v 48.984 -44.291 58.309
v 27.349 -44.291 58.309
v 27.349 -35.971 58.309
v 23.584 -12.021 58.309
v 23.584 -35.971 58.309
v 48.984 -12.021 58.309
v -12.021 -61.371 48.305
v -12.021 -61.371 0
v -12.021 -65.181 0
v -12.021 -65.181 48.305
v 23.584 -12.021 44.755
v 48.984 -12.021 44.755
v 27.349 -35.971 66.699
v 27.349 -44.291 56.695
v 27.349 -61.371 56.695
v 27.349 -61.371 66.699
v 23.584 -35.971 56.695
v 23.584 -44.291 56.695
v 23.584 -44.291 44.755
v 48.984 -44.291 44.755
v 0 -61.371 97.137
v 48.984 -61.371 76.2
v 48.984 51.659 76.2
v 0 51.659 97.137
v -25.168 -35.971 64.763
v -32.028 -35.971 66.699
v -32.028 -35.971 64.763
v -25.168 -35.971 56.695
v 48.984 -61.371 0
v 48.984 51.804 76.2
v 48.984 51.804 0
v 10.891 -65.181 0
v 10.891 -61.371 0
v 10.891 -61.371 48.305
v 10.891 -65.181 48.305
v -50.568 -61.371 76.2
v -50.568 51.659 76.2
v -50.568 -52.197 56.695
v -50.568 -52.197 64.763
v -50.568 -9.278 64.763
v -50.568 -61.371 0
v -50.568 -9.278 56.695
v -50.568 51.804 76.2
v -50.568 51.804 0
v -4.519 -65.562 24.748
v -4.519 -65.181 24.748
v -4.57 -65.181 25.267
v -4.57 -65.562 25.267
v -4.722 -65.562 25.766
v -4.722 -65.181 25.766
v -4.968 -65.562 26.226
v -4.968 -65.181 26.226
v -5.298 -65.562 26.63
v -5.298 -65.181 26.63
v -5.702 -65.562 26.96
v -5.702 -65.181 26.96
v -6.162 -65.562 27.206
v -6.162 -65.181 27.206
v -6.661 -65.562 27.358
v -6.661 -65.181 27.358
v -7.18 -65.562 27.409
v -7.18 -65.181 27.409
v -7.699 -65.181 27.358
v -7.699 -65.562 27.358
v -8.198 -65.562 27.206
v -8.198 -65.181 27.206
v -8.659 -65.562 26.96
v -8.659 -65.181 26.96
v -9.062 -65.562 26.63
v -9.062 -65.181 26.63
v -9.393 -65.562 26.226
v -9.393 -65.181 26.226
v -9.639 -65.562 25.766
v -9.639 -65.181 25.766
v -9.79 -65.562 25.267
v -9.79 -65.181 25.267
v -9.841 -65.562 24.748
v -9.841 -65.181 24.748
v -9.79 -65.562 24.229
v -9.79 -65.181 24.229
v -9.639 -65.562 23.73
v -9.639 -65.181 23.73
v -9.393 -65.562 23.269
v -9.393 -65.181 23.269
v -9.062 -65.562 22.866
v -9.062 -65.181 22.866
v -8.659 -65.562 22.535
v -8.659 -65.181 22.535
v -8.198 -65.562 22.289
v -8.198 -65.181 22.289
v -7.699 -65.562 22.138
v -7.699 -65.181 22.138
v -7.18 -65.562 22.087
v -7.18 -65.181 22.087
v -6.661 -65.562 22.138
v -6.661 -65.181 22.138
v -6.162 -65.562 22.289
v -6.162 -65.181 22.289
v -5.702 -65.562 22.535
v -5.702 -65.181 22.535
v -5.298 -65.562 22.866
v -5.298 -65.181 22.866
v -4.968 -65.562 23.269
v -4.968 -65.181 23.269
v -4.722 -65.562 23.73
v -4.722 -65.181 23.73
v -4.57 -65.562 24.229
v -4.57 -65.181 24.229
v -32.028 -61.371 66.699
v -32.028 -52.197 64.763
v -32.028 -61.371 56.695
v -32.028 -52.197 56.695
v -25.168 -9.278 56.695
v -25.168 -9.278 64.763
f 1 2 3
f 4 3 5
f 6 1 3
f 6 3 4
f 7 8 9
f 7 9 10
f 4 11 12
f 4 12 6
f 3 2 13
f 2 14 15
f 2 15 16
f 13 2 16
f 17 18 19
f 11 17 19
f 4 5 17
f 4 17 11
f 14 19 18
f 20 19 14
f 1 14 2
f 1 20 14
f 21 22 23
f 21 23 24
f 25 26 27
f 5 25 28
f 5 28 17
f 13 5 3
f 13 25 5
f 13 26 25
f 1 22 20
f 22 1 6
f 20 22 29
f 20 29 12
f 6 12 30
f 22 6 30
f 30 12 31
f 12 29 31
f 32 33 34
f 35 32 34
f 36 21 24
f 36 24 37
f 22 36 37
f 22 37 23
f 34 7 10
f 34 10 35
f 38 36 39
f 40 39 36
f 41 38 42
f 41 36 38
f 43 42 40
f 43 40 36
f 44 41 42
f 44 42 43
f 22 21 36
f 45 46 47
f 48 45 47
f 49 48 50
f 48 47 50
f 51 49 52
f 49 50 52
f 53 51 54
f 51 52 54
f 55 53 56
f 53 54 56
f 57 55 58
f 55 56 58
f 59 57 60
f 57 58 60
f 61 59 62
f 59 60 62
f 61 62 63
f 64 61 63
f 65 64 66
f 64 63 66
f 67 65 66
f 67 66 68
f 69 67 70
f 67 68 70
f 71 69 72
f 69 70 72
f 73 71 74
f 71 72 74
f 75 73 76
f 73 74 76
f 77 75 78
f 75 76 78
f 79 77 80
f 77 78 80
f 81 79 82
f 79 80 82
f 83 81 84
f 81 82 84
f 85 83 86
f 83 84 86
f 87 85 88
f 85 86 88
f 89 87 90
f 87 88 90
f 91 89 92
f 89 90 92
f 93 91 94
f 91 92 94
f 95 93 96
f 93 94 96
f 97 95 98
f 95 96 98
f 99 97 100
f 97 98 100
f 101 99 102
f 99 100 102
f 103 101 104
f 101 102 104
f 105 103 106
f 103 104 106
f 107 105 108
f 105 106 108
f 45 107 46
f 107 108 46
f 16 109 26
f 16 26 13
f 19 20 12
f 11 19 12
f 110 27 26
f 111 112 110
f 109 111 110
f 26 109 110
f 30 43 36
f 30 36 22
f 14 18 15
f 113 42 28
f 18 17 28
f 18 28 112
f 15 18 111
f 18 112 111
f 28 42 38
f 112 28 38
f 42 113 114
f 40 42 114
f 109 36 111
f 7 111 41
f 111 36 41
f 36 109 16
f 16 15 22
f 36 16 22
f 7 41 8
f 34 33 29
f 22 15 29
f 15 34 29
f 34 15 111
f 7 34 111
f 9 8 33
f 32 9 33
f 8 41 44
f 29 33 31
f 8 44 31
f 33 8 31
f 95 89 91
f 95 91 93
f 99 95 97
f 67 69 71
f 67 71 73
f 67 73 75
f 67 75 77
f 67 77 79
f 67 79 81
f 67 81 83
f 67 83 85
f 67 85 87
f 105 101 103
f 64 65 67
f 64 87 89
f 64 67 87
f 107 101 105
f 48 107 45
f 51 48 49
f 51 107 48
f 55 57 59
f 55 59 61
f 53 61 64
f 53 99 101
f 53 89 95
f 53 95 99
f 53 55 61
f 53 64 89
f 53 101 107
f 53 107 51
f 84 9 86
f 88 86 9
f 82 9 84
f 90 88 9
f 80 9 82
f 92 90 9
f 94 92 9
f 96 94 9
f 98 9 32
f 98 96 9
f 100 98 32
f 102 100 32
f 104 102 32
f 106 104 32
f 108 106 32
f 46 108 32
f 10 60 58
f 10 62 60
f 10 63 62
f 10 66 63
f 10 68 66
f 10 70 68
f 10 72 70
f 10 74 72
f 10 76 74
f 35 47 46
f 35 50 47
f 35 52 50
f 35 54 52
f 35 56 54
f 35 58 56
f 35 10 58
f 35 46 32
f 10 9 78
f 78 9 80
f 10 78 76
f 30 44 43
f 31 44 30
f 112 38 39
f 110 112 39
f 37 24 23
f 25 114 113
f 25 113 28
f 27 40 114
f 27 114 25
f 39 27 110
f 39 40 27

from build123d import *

# Parameters (mm, degrees)
F0_W      = 99.5517745614
F0_H      = 113.1746582687
F1_DEPTH  = 76.2
F3_DEPTH  = 113.03
F5_W      = 32.2701362893
F5_H      = 13.553455472
F6_DEPTH  = 25.4
F4_W      = 22.911792621
F4_H      = 48.3050867915
F7_DEPTH  = 3.81
F8_W      = 59.377040714
F8_H      = 10.0037418306
F9_DEPTH  = 25.4
F10_W     = 42.9192762822
F10_H     = 8.0675370991
F11_DEPTH = 25.4
F12_R     = 2.6610637676
F13_DEPTH = 0.381


with BuildPart() as f1:
    # F0 (on Top) → F1 (new body)
    with BuildSketch(Plane.XY):
        with Locations((-0.791631639, -4.7834534198)):
            Rectangle(F0_W, F0_H)
    extrude(amount=F1_DEPTH)

    # F5 (on face) → F6 (cut)
    with BuildSketch(Plane.YZ.offset(48.9842556417)):
        with Locations((-28.1556905247, 51.5321008861)):
            Rectangle(F5_W, F5_H)
    extrude(amount=-F6_DEPTH, mode=Mode.SUBTRACT)

    # F4 (on face) → F7 (join)
    with BuildSketch(Plane.XZ.offset(61.3707825541)):
        with Locations((-0.5647279322, 24.1525433958)):
            Rectangle(F4_W, F4_H)
    extrude(amount=F7_DEPTH)

    # F8 (on face) → F9 (cut)
    with BuildSketch(Plane.XZ.offset(61.3707825541)):
        with Locations((-2.3395847529, 61.6971943527)):
            Rectangle(F8_W, F8_H)
    extrude(amount=-F9_DEPTH, mode=Mode.SUBTRACT)

    # F10 (on face) → F11 (cut)
    with BuildSketch(Plane(origin=(-50.5675189197, 0, 0), x_dir=(0, -1, 0), z_dir=(-1, 0, 0))):
        with Locations((30.7373004034, 60.729091987)):
            Rectangle(F10_W, F10_H)
    extrude(amount=-F11_DEPTH, mode=Mode.SUBTRACT)

    # F12 (on face) → F13 (join)
    with BuildSketch(Plane.XZ.offset(65.1807825541)):
        with Locations((-7.1801049635, 24.7478894889)):
            Circle(F12_R)
    extrude(amount=F13_DEPTH)


with BuildPart() as f3:
    # F2 (on face) → F3 (new body)
    with BuildSketch(Plane.XZ.offset(61.3707825541)):
        Polygon((0, 76.2), (0, 97.1367135644), (-50.5675189197, 76.2), align=None)
        Polygon((48.9842556417, 76.2), (0, 97.1367135644), (0, 76.2), align=None)
    extrude(amount=-F3_DEPTH)


solid = Compound([f1.part, f3.part])
